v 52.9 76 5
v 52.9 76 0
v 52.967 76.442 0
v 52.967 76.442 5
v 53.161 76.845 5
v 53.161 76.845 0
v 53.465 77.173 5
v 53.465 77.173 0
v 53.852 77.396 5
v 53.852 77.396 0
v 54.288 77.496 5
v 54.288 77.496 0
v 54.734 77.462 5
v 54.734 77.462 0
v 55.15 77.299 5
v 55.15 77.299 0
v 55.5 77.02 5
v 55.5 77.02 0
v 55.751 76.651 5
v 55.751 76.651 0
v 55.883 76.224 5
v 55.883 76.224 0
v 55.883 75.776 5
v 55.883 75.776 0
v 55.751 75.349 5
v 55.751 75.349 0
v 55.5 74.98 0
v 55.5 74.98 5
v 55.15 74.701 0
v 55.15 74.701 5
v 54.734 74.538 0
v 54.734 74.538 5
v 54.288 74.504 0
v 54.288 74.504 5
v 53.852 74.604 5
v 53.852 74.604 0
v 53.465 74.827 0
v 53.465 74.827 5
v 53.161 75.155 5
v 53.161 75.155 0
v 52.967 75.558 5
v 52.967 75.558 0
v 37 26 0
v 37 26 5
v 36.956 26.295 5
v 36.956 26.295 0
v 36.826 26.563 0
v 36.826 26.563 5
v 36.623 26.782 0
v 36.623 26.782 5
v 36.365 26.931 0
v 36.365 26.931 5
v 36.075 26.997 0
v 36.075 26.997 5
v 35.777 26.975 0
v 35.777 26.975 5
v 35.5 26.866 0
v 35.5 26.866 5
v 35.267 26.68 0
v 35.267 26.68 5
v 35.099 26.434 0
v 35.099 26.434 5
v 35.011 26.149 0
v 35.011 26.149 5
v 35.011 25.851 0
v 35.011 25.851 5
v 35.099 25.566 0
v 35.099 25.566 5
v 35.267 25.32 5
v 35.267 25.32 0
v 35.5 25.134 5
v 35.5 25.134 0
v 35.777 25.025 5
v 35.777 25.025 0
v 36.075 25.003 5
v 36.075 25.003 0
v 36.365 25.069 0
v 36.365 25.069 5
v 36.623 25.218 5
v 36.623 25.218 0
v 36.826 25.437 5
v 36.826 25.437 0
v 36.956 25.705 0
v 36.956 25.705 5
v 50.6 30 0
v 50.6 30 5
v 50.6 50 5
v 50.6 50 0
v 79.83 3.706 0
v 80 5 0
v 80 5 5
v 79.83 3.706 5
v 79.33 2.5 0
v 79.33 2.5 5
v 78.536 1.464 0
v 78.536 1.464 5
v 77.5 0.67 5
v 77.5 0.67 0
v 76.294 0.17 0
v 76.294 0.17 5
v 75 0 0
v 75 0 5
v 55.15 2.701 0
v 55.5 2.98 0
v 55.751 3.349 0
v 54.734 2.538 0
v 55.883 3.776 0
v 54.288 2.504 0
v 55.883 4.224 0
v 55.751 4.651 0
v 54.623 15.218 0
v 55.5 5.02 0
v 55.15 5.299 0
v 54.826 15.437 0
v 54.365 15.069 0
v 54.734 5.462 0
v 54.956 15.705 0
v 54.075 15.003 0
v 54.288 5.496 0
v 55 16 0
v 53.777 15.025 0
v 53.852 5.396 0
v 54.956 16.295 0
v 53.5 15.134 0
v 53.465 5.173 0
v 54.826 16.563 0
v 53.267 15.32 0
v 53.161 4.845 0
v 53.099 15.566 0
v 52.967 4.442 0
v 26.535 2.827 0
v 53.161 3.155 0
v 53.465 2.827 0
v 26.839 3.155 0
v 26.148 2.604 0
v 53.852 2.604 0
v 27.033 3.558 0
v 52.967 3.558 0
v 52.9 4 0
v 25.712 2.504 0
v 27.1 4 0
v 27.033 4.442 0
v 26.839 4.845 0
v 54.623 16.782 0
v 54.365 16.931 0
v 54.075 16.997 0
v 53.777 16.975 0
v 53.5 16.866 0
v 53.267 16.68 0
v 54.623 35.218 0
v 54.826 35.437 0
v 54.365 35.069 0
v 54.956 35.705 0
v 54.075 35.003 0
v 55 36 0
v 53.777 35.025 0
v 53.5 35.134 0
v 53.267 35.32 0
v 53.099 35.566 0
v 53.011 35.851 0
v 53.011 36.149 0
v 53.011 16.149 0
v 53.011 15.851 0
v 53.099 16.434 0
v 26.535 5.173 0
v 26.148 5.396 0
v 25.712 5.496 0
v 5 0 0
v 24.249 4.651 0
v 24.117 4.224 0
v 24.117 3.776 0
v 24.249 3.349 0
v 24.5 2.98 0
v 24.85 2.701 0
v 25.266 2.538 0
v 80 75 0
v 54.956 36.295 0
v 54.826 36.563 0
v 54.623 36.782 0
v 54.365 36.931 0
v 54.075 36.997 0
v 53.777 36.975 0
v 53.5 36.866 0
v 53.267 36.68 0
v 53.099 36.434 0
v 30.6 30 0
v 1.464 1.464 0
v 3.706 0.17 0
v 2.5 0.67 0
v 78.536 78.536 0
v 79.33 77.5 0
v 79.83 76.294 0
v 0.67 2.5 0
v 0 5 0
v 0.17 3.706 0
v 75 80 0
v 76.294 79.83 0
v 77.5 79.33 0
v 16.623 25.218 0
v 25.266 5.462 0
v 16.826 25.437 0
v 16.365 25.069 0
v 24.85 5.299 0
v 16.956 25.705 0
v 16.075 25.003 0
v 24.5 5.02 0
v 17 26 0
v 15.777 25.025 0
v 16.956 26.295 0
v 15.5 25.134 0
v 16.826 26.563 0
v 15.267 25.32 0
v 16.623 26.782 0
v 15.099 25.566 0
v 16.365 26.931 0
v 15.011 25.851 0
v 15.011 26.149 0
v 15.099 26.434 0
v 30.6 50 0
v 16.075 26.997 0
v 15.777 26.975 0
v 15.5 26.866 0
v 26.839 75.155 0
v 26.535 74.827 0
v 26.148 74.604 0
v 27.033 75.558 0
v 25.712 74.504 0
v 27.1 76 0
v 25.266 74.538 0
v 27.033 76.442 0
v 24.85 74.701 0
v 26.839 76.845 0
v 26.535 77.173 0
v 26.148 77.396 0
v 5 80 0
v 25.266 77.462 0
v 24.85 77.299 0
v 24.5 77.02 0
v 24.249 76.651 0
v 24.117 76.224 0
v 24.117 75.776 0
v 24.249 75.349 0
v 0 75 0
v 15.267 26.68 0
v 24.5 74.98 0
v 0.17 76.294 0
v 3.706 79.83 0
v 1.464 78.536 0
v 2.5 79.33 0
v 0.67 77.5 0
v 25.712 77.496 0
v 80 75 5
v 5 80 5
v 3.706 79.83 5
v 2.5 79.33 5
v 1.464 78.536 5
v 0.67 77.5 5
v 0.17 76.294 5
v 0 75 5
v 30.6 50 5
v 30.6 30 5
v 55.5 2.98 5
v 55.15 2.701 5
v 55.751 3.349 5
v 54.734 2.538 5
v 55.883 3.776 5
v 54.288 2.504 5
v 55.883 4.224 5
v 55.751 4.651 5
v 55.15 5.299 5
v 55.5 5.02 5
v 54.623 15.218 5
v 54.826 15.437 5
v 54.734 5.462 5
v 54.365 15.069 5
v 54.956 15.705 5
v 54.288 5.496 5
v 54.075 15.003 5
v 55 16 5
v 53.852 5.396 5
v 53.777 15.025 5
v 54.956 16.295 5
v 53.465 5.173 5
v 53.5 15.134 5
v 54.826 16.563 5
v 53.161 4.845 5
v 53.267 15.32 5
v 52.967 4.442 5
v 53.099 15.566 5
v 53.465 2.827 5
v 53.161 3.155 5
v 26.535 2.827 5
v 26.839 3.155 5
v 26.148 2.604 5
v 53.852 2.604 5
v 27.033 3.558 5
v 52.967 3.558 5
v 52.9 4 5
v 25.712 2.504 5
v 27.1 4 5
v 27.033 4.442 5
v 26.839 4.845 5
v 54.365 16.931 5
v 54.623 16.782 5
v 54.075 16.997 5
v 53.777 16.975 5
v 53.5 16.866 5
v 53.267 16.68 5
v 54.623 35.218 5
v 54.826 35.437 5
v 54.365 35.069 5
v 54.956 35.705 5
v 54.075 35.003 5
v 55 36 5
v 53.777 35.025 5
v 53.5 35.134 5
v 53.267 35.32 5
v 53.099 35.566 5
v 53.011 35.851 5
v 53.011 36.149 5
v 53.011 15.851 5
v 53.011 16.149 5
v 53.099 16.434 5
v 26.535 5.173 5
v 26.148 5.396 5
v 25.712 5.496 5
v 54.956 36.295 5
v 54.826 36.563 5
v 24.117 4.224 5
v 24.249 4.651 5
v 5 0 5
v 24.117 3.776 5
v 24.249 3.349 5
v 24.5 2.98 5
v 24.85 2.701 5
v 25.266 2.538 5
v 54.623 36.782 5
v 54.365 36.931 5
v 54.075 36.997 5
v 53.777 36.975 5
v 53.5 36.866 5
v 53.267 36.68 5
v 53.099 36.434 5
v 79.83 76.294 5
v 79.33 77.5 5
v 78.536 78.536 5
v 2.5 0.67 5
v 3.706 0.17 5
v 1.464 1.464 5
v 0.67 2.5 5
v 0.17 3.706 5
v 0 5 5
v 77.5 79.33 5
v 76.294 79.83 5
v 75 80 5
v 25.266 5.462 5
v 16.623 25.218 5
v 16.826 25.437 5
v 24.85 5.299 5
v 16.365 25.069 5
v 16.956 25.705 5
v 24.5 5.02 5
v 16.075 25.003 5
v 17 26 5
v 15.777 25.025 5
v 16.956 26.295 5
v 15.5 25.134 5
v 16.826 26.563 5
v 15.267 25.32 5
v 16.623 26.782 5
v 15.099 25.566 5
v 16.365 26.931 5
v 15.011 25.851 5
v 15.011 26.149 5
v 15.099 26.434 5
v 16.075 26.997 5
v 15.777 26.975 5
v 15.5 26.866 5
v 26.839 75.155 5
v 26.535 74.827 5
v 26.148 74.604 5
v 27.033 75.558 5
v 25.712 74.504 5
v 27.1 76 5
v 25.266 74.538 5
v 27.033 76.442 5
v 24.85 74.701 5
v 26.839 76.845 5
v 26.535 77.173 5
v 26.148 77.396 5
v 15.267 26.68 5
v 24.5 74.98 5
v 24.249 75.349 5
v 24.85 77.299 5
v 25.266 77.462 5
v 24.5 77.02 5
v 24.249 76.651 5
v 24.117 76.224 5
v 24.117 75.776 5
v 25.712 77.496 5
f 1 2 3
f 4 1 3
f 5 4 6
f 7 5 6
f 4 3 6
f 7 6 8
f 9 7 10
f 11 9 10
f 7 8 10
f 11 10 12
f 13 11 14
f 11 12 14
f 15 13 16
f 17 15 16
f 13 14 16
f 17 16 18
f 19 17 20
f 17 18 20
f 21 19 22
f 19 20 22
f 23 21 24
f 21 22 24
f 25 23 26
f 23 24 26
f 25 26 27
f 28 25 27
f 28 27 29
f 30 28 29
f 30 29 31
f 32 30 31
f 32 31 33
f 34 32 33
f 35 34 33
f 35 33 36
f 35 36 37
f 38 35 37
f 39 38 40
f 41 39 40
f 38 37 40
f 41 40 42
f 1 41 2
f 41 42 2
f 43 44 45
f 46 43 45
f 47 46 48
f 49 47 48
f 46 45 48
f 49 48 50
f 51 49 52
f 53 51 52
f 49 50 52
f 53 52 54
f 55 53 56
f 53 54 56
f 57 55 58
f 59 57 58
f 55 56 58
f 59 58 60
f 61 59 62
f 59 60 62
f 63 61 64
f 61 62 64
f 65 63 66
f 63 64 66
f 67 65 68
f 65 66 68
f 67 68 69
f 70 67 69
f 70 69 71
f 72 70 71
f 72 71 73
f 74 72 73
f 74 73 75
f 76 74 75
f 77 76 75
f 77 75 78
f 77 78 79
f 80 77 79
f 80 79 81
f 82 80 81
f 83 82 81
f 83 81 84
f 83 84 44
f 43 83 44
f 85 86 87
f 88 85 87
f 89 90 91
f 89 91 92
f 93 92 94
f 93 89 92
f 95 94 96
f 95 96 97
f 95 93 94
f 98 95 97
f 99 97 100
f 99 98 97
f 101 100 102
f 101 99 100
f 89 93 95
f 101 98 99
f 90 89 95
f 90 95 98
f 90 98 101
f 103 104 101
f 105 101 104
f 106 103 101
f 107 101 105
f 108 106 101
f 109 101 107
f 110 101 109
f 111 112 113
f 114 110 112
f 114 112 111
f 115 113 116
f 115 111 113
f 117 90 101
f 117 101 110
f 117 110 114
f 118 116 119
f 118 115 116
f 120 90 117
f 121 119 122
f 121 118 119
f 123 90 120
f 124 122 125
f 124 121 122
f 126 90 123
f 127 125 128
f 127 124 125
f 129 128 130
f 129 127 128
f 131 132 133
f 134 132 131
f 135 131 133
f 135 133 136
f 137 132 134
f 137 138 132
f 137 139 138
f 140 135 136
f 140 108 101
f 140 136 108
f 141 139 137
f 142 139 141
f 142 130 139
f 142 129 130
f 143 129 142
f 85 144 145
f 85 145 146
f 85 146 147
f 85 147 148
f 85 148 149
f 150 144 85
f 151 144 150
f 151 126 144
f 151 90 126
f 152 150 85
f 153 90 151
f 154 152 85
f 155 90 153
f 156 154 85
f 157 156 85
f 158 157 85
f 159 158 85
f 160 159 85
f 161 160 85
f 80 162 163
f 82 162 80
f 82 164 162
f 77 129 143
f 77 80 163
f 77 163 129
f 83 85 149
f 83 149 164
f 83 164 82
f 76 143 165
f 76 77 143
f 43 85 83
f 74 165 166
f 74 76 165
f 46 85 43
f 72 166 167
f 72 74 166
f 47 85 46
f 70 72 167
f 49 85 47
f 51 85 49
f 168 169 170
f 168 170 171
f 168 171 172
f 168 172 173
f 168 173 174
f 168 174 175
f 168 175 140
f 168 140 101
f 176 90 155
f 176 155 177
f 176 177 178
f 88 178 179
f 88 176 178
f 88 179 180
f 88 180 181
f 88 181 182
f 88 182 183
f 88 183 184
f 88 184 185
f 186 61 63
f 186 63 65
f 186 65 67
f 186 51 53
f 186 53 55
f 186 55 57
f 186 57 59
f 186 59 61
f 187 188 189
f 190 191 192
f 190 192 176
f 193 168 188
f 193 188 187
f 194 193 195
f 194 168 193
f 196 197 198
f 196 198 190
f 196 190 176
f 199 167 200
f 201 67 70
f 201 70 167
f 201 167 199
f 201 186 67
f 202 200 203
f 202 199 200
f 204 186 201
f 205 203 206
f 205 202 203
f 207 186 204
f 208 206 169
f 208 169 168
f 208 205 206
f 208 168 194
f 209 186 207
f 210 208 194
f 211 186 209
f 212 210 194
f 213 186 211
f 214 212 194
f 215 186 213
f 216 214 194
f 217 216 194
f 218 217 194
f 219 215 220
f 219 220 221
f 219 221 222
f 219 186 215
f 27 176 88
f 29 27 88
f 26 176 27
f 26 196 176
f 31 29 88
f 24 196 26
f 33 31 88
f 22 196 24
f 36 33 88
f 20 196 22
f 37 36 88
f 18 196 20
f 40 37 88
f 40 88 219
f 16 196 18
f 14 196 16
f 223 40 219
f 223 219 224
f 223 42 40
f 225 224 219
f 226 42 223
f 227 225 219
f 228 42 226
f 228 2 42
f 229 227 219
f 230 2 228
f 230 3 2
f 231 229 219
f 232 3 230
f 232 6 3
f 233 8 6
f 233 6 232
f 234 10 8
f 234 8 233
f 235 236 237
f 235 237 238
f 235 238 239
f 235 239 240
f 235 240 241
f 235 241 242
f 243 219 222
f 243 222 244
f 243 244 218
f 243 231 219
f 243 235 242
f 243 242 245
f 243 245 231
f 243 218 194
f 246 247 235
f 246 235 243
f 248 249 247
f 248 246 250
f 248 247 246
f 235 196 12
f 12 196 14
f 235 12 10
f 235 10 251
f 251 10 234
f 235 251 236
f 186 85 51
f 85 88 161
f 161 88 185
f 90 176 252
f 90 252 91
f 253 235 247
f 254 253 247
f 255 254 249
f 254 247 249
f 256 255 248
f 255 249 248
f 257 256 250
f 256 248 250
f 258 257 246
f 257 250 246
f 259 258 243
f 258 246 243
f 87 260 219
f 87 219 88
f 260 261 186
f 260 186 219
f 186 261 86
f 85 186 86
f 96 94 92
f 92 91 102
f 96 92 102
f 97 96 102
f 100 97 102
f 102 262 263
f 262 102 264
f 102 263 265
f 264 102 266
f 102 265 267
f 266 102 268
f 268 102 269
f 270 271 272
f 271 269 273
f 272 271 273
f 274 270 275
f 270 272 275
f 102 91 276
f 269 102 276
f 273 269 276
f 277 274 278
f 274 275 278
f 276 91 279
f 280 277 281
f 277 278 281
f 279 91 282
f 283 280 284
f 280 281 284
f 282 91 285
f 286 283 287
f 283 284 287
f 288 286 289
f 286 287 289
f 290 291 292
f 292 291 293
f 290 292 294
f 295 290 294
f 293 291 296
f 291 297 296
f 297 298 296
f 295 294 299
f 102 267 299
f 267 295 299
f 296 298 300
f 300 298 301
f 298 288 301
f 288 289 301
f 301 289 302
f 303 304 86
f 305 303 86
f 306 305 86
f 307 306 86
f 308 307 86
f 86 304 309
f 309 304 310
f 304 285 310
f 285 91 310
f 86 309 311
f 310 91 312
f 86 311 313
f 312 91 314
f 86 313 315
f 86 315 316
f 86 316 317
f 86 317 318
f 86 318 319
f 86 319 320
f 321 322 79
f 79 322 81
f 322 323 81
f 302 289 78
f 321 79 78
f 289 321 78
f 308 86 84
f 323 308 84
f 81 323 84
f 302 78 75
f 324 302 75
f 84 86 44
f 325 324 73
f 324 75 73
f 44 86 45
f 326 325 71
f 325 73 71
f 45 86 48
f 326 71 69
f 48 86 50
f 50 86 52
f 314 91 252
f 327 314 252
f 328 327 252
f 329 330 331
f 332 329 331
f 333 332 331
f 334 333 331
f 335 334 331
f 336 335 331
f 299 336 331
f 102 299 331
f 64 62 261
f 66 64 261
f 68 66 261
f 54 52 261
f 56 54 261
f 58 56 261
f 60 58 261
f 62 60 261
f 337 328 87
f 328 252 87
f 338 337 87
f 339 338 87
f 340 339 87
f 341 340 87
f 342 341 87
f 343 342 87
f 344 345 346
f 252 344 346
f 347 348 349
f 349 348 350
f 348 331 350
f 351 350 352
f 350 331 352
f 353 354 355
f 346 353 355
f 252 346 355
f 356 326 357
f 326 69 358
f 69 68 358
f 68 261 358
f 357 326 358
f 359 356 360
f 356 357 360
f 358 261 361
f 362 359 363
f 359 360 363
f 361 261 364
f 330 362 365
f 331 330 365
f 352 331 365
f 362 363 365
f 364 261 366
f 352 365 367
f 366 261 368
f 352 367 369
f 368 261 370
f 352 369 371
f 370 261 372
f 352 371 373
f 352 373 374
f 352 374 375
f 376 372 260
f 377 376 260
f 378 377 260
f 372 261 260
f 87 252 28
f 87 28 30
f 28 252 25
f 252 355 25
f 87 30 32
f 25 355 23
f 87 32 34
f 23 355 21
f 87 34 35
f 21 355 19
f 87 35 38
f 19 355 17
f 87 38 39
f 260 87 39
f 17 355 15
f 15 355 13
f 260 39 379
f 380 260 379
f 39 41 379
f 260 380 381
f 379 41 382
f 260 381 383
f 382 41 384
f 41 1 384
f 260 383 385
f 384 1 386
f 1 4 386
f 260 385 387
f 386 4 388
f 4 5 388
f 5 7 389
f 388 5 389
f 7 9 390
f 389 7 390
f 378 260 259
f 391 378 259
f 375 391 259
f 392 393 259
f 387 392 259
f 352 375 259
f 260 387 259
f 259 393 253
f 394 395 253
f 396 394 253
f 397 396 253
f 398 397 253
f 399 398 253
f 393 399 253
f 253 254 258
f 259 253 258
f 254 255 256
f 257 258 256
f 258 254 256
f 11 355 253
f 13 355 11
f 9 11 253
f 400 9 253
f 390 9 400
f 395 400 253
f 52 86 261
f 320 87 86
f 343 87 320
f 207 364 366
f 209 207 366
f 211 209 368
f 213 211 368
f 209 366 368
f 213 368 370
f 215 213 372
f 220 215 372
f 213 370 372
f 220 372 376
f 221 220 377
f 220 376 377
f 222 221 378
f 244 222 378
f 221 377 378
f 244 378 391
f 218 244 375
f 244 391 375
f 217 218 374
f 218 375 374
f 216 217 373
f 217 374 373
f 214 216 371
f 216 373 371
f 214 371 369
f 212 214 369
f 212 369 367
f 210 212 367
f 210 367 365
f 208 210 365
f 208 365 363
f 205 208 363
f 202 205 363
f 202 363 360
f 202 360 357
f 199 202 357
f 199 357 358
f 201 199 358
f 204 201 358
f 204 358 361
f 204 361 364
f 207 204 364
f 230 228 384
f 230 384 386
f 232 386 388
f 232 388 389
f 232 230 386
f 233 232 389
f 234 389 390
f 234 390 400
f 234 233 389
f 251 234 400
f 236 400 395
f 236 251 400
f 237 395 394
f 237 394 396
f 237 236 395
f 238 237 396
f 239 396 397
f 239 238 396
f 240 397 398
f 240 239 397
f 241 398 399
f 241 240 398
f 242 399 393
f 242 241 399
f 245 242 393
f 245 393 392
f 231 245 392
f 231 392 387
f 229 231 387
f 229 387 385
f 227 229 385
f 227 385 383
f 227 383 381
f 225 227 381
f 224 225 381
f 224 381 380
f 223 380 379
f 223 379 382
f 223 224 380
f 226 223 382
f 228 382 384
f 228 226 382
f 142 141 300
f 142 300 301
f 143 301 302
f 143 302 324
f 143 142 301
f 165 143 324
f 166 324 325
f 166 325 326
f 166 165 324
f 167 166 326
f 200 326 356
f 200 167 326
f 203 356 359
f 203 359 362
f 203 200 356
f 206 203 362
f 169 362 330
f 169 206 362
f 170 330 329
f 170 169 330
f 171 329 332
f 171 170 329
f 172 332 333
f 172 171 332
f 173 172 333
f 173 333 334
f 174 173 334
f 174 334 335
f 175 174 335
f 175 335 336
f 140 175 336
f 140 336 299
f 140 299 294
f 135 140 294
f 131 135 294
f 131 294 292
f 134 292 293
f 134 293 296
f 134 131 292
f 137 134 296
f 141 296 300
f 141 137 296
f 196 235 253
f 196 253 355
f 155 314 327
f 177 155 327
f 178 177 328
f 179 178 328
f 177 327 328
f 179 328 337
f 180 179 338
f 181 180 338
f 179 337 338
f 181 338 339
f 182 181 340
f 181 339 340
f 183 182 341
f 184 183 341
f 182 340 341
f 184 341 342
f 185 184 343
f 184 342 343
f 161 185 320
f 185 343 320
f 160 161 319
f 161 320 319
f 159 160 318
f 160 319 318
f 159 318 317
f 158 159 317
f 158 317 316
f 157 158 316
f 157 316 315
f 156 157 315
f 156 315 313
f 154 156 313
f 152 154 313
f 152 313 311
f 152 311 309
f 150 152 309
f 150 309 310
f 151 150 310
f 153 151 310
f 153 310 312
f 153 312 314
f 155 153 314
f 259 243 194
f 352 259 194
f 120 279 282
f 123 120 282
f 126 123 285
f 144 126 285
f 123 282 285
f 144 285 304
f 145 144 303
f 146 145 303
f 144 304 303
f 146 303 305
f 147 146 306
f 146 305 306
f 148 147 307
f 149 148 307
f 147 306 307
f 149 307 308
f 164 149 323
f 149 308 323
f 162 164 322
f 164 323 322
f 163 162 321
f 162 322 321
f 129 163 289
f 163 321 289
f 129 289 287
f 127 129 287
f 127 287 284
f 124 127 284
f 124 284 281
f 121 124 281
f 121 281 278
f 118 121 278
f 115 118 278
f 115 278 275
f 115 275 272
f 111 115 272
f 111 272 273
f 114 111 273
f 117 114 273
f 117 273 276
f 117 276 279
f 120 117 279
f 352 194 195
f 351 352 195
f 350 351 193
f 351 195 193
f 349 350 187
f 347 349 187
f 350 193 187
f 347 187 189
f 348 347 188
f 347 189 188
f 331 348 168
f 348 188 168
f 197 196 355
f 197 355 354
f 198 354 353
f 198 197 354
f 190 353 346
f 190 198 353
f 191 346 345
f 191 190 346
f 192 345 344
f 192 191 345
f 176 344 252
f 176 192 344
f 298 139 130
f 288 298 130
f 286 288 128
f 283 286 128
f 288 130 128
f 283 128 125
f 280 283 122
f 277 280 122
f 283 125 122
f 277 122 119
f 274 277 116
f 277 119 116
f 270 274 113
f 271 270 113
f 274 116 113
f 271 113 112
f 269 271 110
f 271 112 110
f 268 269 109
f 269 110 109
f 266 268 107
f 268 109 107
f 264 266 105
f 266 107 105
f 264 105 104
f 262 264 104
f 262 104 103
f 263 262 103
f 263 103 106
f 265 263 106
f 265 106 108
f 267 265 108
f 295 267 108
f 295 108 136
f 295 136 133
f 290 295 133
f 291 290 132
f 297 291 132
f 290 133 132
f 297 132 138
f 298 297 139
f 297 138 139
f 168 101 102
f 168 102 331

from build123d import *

# Parameters (mm, degrees)
ESQUISSE1_R             = 1.5
BOSS_EXTRU_1_DEPTH      = 5
ESQUISSE2_W             = 20
ESQUISSE2_H             = 20
ENL_V_MAT_EXTRU_1_DEPTH = 114.247516529
ESQUISSE3_R             = 1
ENL_V_MAT_EXTRU_2_DEPTH = 114.247516529


with BuildPart() as part:
    # Esquisse1 → Boss.-Extru.1 (new body)
    with BuildSketch(Plane.XY):
        with BuildLine():
            Line((40, 50), (40, 80))
            Line((40, 80), (5, 80))
            ThreePointArc((5, 80), (1.464466094, 78.535533906), (0, 75))
            Line((0, 75), (0, 5))
            ThreePointArc((0, 5), (1.464466094, 1.464466094), (5, 0))
            Line((5, 0), (40, 0))
            Line((40, 0), (40, 30))
            Line((40, 30), (40, 50))
        make_face()
        with Locations((25.6, 76)):
            Circle(ESQUISSE1_R, mode=Mode.SUBTRACT)
        with Locations((25.6, 4)):
            Circle(ESQUISSE1_R, mode=Mode.SUBTRACT)
    boss_extru_1 = extrude(amount=BOSS_EXTRU_1_DEPTH)

    # Symétrie1: Boss.-Extru.1 across plane
    add(boss_extru_1.mirror(Plane(origin=(40, 50, 5), x_dir=(0, 0, 1), z_dir=(-1, 0, 0))))

    # Esquisse2 → Enlèv. mat.-Extru.1 (cut, through all)
    with BuildSketch(Plane.XY.offset(5)):
        with Locations((40.6, 40)):
            Rectangle(ESQUISSE2_W, ESQUISSE2_H)
    extrude(amount=-ENL_V_MAT_EXTRU_1_DEPTH, mode=Mode.SUBTRACT)

    # Esquisse3 → Enlèv. mat.-Extru.2 (cut, through all)
    with BuildSketch(Plane.XY.offset(5)):
        with Locations((54, 36)):
            Circle(ESQUISSE3_R)
        with Locations((54, 16)):
            Circle(ESQUISSE3_R)
        with Locations((36, 26)):
            Circle(ESQUISSE3_R)
        with Locations((16, 26)):
            Circle(ESQUISSE3_R)
    extrude(amount=-ENL_V_MAT_EXTRU_2_DEPTH, mode=Mode.SUBTRACT)


solid = part.part
